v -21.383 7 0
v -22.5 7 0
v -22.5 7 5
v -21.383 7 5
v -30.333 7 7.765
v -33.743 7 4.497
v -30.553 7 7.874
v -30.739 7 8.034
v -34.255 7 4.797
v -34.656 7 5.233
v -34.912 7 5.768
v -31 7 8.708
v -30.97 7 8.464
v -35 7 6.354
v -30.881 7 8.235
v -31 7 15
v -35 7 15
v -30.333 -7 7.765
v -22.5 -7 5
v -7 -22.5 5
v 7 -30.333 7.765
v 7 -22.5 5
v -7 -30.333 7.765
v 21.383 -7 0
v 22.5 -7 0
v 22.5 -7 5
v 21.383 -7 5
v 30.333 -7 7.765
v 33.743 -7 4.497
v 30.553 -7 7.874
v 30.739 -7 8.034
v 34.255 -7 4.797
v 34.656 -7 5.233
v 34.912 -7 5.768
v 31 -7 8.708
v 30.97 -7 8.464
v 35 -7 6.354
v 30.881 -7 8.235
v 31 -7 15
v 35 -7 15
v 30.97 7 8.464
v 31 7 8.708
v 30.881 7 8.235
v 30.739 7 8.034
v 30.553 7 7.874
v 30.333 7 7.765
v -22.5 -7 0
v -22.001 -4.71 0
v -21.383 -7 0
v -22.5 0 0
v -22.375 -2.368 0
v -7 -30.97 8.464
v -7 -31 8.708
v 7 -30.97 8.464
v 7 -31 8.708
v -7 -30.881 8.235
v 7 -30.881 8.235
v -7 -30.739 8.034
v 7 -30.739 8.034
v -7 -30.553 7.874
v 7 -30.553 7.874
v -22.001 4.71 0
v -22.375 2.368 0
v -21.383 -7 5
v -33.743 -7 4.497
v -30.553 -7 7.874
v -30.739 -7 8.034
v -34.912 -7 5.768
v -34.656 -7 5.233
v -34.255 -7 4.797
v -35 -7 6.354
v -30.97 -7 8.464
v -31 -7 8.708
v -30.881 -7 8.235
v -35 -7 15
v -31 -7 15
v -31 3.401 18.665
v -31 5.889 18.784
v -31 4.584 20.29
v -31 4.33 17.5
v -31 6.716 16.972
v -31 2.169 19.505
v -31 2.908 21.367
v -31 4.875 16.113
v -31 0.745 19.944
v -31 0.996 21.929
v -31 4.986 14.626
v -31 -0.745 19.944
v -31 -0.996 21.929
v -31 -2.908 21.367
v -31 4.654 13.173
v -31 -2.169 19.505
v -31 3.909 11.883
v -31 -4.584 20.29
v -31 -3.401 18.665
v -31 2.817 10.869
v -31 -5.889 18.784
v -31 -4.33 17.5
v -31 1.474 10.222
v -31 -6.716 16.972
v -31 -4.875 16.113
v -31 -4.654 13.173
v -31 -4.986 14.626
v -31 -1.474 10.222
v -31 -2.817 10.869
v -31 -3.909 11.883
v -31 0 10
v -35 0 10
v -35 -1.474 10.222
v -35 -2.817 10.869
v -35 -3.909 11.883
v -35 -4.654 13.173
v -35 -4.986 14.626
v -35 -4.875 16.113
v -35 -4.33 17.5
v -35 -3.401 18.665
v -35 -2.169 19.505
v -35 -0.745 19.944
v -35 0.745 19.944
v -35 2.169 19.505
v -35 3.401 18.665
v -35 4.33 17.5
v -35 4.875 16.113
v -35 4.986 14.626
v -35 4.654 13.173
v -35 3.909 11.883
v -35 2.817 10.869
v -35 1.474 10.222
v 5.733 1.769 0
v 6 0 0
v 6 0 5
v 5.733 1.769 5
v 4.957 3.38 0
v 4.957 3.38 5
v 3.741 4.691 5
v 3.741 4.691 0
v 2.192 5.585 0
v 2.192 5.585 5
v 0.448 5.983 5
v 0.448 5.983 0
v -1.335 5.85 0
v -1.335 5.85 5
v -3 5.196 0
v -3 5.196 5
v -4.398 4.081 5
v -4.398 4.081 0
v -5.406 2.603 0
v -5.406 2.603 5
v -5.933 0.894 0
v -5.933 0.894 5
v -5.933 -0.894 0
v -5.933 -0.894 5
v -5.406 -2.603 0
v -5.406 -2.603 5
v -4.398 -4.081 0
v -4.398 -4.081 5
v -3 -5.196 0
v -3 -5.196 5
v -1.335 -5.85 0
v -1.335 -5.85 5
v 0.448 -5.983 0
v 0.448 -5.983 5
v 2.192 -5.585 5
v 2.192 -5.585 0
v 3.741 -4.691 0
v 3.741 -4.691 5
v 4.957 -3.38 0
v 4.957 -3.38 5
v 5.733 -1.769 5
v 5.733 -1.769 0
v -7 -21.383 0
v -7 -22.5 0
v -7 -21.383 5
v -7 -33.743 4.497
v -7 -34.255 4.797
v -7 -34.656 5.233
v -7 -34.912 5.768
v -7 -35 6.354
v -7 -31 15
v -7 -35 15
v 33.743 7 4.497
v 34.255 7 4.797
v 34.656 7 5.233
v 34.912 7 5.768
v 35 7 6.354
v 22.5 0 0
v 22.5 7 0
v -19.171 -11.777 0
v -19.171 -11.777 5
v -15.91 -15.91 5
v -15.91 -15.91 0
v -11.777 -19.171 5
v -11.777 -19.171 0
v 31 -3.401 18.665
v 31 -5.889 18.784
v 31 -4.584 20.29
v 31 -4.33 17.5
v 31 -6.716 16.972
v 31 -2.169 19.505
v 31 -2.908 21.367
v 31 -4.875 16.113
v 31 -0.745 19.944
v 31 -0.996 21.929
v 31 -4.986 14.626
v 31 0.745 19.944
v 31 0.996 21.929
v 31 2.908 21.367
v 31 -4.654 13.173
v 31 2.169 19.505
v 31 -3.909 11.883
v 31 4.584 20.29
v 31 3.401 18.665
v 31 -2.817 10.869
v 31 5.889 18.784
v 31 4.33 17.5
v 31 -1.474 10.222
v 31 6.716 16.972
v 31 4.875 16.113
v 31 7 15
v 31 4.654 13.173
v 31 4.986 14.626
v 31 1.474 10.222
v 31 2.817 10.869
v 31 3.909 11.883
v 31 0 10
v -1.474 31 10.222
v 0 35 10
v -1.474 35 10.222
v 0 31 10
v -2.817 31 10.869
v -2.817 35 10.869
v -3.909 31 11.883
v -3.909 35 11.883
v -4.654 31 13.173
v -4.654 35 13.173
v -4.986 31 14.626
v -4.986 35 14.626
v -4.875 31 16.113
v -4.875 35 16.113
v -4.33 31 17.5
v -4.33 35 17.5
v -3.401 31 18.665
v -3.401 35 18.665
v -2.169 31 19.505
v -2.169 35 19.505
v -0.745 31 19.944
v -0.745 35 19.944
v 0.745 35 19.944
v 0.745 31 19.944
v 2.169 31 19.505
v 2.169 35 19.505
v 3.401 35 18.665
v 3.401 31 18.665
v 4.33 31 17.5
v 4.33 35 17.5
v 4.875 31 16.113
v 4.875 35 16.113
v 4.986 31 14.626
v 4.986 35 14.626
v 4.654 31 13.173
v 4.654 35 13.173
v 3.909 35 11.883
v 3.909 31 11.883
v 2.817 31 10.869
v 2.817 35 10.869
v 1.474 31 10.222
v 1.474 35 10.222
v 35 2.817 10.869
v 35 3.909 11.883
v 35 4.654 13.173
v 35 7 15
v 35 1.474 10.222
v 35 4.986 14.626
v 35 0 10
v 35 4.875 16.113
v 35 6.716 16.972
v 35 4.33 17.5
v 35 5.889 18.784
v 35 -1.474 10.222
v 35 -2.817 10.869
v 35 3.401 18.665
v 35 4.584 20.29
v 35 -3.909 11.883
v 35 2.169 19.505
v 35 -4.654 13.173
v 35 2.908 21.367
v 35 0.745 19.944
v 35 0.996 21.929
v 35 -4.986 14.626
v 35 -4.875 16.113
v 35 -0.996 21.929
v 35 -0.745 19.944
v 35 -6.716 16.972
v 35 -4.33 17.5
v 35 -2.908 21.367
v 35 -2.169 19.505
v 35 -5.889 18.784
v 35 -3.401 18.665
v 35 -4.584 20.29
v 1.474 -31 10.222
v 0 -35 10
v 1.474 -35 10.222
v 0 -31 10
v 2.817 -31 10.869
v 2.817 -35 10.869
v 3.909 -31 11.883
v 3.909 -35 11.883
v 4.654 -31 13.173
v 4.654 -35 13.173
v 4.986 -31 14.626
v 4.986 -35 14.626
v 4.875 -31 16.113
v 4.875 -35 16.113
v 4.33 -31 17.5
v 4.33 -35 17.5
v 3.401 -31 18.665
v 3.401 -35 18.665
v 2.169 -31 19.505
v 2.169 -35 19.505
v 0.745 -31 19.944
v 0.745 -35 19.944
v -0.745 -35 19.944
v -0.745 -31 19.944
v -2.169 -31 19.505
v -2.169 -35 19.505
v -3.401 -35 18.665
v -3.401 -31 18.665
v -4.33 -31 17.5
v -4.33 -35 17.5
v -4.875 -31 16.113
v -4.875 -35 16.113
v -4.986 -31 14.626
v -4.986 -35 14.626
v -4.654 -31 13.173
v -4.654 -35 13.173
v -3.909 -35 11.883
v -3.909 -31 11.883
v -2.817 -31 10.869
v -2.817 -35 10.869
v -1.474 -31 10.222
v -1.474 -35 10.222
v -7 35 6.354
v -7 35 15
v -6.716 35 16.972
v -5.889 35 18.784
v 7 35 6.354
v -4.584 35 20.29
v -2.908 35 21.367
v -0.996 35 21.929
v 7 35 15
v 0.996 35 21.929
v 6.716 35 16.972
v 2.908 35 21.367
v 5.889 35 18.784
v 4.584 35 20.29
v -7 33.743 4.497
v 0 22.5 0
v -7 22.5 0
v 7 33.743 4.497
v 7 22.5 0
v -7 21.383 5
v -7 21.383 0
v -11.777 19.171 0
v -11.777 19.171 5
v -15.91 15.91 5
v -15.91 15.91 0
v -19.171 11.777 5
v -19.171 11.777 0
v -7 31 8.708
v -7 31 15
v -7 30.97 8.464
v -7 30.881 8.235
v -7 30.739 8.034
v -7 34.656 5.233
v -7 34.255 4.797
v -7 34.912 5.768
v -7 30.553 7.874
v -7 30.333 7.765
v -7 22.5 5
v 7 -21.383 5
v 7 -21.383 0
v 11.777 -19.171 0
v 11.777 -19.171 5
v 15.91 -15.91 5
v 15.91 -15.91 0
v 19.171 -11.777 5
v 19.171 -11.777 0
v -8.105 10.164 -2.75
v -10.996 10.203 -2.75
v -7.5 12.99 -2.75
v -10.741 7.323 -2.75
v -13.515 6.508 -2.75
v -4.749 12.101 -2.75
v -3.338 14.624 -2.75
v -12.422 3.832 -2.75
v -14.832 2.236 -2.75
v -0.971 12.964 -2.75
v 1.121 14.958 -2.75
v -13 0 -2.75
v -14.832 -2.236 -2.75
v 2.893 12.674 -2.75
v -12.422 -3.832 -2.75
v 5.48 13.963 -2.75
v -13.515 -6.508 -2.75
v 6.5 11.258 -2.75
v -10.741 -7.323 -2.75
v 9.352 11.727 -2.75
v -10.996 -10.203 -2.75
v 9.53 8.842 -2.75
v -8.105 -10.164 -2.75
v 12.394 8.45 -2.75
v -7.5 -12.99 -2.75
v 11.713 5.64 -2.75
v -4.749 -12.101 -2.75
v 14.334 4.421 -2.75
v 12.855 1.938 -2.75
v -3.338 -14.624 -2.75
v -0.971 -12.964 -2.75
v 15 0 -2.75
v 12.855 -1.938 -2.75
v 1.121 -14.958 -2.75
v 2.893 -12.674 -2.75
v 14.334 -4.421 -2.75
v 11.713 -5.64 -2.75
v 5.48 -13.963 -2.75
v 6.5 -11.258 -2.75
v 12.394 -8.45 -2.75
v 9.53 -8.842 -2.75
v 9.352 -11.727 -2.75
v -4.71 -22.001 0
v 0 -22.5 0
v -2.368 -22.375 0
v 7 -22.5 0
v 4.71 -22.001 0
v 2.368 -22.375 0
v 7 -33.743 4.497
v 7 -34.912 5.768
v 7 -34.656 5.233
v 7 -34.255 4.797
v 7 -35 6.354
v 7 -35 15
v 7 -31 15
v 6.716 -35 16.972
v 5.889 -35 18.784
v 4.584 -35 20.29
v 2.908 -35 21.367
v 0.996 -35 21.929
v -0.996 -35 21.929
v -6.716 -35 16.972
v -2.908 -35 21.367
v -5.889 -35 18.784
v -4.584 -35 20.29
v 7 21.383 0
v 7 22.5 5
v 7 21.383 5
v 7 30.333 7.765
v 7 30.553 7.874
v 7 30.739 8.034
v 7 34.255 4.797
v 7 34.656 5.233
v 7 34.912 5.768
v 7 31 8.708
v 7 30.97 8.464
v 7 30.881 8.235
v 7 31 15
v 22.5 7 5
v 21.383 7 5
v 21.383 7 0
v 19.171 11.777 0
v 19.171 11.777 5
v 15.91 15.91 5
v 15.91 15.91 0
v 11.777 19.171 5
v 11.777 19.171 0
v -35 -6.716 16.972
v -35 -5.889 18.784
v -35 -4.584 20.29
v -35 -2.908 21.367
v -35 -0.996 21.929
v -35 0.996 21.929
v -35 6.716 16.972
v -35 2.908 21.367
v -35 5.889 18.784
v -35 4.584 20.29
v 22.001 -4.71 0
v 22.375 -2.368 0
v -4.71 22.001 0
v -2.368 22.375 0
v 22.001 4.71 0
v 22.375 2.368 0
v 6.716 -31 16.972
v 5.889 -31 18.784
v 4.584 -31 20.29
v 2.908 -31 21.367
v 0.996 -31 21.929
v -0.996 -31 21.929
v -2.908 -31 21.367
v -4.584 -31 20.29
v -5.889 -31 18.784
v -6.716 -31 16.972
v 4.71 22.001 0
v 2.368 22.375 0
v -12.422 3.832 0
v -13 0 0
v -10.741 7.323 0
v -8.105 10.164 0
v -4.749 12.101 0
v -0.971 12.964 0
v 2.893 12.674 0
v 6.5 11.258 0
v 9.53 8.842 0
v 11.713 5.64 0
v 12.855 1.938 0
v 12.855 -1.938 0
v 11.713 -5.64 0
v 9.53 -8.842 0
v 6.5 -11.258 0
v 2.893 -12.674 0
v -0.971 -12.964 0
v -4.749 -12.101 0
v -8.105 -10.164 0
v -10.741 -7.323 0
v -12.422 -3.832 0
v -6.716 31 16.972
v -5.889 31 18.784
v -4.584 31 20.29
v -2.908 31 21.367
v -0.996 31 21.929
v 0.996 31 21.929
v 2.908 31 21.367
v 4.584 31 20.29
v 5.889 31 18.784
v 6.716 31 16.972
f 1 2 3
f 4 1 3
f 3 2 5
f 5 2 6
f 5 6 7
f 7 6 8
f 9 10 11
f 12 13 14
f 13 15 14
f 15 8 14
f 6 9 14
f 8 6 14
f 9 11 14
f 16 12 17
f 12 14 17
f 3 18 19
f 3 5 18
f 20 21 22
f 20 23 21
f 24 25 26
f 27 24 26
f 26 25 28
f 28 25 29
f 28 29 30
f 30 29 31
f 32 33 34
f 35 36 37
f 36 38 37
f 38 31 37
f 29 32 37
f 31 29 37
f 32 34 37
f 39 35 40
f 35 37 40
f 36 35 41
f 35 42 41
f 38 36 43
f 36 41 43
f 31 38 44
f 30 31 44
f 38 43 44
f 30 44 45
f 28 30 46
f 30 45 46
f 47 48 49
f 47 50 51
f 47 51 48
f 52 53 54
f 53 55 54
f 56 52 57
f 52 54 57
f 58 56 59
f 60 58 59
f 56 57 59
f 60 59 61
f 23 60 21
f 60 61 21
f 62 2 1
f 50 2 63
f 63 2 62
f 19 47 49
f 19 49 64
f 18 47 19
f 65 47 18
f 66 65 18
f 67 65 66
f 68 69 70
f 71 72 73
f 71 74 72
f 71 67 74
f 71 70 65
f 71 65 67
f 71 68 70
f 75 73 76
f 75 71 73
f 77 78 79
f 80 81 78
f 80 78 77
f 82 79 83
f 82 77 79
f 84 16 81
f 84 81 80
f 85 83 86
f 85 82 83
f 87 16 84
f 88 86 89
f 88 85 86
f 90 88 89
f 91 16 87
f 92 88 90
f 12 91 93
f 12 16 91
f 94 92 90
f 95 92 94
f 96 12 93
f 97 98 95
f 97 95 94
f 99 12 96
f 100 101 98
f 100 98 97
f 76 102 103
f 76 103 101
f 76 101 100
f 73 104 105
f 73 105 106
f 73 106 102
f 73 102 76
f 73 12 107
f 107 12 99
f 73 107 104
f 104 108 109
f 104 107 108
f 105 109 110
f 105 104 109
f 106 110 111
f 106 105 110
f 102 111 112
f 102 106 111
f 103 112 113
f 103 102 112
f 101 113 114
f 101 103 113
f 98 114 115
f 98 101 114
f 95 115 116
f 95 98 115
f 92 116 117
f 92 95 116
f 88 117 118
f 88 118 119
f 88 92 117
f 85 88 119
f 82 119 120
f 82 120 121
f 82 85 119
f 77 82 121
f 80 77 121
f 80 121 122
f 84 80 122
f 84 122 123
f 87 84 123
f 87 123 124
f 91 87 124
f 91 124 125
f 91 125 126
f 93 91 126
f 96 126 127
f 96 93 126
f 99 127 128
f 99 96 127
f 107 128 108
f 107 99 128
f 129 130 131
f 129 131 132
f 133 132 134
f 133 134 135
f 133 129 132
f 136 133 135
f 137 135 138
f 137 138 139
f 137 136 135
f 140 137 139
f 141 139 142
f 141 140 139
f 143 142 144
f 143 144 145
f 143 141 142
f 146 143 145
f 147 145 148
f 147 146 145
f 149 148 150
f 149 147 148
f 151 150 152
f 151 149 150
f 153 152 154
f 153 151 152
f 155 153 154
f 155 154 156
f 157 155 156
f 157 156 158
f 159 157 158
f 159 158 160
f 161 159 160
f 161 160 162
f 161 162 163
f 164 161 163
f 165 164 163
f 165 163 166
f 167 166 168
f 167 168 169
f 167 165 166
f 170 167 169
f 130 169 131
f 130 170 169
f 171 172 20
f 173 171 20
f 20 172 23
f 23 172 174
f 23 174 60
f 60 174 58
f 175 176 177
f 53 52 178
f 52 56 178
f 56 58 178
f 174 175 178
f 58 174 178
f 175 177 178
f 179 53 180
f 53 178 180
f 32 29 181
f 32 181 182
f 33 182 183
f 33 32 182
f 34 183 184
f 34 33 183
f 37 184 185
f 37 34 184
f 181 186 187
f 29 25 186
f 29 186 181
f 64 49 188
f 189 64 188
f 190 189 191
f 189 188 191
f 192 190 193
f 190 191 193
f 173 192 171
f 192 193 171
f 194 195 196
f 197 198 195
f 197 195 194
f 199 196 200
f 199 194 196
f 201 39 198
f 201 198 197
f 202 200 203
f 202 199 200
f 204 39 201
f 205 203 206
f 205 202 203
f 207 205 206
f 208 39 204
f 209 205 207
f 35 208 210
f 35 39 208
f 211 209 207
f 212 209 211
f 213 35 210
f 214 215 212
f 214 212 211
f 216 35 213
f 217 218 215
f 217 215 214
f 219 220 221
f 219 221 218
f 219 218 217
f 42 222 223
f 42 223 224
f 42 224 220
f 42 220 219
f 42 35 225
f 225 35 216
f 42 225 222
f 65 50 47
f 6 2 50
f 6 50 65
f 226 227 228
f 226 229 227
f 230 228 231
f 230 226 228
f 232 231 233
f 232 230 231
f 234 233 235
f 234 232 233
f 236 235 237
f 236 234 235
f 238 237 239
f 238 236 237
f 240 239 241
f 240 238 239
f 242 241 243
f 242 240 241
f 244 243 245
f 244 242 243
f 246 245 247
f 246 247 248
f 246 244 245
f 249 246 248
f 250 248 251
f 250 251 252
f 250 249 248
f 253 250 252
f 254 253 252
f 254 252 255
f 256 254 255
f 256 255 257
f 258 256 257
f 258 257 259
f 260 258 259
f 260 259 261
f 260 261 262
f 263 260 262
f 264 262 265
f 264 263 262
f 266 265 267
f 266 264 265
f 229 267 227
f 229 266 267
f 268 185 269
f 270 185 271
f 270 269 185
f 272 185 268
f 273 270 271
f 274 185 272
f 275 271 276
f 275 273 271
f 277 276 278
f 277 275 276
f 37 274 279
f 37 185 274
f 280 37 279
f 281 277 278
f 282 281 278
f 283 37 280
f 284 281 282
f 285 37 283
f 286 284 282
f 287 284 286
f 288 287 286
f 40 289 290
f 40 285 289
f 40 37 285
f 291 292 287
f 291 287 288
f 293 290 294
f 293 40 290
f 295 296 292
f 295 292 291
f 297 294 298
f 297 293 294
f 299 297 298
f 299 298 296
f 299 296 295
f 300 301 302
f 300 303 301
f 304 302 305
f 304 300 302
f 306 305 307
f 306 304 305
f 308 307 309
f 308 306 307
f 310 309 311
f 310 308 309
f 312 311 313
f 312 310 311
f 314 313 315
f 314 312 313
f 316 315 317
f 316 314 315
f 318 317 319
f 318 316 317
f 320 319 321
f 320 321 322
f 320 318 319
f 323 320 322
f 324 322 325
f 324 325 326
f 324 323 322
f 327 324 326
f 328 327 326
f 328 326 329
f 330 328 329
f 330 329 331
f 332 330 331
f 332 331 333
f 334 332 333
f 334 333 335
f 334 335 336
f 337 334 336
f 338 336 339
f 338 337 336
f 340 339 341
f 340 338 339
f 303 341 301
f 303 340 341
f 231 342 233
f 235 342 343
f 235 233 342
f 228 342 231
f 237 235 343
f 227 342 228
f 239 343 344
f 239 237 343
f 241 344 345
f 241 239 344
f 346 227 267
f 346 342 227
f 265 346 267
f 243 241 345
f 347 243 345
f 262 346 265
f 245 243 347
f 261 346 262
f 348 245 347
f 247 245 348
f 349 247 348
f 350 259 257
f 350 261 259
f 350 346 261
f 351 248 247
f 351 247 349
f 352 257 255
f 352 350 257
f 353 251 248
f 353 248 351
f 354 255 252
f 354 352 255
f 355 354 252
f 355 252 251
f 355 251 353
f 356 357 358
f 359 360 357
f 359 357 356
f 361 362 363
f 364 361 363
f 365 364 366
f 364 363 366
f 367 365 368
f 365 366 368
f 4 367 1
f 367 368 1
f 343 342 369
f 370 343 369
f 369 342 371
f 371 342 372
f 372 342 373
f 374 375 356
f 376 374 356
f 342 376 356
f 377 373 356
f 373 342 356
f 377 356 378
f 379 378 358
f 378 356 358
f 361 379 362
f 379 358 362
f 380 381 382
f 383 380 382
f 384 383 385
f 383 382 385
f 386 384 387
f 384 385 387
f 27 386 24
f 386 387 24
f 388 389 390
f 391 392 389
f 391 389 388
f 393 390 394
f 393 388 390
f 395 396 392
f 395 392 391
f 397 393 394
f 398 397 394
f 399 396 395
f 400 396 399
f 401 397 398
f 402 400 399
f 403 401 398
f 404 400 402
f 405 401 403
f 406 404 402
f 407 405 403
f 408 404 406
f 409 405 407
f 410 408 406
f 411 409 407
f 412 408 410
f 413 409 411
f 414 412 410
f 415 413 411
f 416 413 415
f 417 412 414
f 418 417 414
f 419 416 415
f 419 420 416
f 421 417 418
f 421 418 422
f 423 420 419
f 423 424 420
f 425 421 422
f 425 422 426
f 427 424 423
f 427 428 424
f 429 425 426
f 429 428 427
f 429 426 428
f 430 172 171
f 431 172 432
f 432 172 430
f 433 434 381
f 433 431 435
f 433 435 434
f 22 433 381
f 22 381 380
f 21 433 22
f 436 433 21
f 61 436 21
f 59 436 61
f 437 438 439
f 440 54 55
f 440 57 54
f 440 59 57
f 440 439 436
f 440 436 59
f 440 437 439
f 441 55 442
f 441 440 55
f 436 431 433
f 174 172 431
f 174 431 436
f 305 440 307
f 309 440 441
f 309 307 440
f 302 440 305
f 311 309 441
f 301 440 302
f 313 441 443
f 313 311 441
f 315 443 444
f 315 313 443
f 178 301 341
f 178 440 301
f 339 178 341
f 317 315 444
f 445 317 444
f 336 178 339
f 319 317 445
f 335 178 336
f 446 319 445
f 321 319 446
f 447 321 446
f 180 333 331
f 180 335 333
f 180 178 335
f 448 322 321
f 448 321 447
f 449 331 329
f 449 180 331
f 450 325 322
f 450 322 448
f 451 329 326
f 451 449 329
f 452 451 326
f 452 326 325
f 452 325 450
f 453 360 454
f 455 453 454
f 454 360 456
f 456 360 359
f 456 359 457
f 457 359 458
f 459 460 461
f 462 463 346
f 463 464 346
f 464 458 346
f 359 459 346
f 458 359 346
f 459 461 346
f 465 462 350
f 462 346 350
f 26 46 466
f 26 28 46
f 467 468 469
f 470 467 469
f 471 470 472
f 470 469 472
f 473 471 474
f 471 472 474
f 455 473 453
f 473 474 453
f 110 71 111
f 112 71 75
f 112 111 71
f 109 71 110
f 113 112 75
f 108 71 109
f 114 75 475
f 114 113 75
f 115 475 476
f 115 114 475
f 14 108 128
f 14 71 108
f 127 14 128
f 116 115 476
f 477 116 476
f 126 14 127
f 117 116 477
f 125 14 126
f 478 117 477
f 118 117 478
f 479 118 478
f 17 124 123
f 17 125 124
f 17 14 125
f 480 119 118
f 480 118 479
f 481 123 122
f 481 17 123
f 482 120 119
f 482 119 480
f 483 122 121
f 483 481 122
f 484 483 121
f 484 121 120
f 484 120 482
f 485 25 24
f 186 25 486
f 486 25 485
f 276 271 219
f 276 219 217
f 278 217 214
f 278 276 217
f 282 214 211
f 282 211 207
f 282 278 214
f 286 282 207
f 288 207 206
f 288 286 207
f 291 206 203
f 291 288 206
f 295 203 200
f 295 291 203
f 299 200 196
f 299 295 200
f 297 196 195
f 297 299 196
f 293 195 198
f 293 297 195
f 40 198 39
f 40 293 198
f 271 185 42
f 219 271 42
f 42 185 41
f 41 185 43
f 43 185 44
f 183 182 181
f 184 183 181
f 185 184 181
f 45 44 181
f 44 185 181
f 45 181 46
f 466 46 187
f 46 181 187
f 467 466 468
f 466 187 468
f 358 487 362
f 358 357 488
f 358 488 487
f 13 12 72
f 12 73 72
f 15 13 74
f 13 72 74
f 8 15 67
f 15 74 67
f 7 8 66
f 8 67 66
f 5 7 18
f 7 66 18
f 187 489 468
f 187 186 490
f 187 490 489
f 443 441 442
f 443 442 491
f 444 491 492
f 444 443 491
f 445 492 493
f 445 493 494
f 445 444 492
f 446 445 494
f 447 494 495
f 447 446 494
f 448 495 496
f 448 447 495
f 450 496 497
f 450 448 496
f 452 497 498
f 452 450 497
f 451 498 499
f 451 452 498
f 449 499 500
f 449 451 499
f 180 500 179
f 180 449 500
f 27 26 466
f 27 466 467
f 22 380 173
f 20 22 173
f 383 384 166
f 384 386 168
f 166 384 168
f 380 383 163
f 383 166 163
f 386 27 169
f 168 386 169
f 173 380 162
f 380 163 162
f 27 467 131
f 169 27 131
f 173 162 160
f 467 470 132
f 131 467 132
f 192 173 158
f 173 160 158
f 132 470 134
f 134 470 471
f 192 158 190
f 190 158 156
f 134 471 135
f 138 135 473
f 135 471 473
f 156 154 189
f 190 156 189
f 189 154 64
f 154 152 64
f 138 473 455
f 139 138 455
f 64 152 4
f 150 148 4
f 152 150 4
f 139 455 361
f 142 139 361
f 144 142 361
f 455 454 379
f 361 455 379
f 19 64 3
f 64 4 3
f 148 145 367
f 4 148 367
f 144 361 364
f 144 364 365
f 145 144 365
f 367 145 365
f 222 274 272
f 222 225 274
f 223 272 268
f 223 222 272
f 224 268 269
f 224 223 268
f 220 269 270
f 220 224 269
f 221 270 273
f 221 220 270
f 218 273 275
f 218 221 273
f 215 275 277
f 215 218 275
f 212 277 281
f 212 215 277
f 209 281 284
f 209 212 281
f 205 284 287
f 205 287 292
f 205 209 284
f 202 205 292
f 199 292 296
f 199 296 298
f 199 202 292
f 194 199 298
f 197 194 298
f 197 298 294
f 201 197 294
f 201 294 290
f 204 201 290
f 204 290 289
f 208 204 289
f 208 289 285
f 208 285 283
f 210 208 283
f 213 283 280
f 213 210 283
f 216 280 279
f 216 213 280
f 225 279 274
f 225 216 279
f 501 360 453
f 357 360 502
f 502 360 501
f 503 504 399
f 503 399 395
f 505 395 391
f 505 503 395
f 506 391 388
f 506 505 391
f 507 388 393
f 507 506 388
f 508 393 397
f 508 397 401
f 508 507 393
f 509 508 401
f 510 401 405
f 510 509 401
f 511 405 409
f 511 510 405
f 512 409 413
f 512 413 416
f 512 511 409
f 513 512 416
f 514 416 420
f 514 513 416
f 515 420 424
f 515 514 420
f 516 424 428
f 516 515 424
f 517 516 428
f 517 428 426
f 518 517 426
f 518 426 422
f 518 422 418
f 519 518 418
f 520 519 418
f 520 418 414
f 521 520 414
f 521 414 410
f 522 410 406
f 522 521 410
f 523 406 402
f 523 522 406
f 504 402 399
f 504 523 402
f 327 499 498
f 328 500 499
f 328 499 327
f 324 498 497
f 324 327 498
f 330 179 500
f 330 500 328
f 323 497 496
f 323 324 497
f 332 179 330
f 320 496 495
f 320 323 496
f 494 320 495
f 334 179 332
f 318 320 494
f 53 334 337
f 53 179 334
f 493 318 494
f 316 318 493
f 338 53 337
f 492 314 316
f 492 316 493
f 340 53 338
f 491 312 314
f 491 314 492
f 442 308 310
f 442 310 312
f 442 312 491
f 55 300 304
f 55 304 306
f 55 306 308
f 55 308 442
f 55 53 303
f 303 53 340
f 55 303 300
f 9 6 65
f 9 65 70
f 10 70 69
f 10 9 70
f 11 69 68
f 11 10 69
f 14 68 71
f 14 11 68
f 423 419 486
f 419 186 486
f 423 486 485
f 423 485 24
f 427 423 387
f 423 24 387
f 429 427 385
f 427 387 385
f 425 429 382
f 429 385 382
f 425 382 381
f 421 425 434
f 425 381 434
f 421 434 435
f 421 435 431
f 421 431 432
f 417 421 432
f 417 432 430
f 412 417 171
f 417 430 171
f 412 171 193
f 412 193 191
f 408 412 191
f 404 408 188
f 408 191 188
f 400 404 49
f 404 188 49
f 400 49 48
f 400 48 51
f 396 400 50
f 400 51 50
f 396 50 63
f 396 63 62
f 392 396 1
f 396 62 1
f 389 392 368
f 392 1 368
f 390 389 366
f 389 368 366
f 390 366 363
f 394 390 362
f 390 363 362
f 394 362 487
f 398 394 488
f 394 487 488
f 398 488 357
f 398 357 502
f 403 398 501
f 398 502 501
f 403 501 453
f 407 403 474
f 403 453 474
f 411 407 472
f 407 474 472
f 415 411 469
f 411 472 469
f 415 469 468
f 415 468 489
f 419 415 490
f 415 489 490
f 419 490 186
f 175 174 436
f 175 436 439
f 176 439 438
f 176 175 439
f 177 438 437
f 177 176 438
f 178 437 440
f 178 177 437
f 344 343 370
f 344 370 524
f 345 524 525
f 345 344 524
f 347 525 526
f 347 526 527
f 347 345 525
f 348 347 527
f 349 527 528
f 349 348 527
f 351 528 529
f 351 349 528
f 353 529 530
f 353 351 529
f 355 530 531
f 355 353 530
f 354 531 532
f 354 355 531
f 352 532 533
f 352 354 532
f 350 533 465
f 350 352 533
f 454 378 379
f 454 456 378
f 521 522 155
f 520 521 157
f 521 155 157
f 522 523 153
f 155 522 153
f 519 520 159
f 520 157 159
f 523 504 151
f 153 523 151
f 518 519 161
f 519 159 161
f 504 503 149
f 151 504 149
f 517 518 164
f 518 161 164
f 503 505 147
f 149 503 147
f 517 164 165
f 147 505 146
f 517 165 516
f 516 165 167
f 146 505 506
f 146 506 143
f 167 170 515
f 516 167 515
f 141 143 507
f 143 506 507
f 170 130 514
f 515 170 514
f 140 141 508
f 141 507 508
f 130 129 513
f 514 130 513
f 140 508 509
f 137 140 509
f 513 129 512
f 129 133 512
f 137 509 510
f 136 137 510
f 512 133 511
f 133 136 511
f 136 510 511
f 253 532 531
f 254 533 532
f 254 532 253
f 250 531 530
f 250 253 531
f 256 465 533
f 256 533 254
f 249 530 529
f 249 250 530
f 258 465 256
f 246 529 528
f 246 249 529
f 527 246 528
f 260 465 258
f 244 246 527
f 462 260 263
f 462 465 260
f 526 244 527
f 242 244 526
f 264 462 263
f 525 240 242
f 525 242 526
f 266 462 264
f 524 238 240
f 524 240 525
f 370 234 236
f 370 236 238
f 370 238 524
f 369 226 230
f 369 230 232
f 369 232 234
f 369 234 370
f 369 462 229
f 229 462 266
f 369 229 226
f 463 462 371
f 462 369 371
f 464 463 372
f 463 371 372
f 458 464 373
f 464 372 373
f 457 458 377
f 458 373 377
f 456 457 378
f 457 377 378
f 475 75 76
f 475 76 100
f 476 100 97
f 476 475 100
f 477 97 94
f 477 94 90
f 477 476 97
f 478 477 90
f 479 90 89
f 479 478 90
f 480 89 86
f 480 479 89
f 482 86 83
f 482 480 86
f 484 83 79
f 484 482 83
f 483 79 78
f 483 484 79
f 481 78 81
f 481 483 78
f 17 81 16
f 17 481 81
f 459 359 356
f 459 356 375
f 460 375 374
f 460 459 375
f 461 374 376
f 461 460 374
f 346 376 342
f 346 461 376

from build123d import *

# Parameters (mm, degrees)
SKETCH3_R                = 22.5
SKETCH3_R_2              = 6
BOSS_EXTRUDE3_DEPTH      = 5
SKETCH4_R                = 15
SKETCH4_R_2              = 13
BOSS_EXTRUDE4_DEPTH      = 2.75
SKETCH10_R               = 7
SKETCH10_R_2             = 5
BOSS_EXTRUDE5_DEPTH      = 2
BOSS_EXTRUDE6_REACH      = 45.9
BOSS_EXTRUDE6_END_RADIUS = 7
SKETCH11_W               = 4
SKETCH11_H               = 14
BOSS_EXTRUDE7_DEPTH      = 14
SKETCH15_W               = 5
SKETCH15_H               = 14
BOSS_EXTRUDE8_DEPTH      = 1.116595
FILLET1_R                = 1
CIRPATTERN4_COUNT        = 4
FILLET1_OF_CIRPATTERN4_R = 1


with BuildPart() as part:
    # Sketch3 → Boss-Extrude3 (new body)
    with BuildSketch(Plane.XY):
        Circle(SKETCH3_R)
        Circle(SKETCH3_R_2, mode=Mode.SUBTRACT)
    extrude(amount=BOSS_EXTRUDE3_DEPTH)

    # Sketch4 → Boss-Extrude4 (add)
    with BuildSketch(Plane(origin=(0, 0, 0), x_dir=(-1, 0, 0), z_dir=(0, 0, -1))):
        with Locations(Location((0, 0, 0), (0, 0, 180))):
            Circle(SKETCH4_R)
        Circle(SKETCH4_R_2, mode=Mode.SUBTRACT)
    extrude(amount=BOSS_EXTRUDE4_DEPTH)

    # Sketch6 → Revolve1 (revolve)
    with BuildSketch(Plane(origin=(0, 0, 0), x_dir=(0, 0, -1), z_dir=(1, 0, 0)), mode=Mode.PRIVATE) as revolve1_sk:
        Polygon((0, 22.5), (0, 15), (2.75, 15), align=None)
    revolve(revolve1_sk.sketch.rotate(Axis((0, 0, 0), (0, 0, -1)), 90), axis=Axis((0, 0, 0), (0, 0, -1)))



with BuildPart() as body_2:
    # Sketch10 → Boss-Extrude5 (new, symmetric)
    with BuildSketch(Plane(origin=(33, 0, 0), x_dir=(0, 0, -1), z_dir=(1, 0, 0))):
        with Locations((-15, 0)):
            Circle(SKETCH10_R)
        with Locations((-15, 0)):
            Circle(SKETCH10_R_2, mode=Mode.SUBTRACT)
    boss_extrude5 = extrude(amount=BOSS_EXTRUDE5_DEPTH, both=True)

    # Boss-Extrude6: up to this cylinder (the profile starts outside it)
    boss_extrude6_end = Plane(origin=(33, 0, 15), z_dir=(-1, 0, 0)) * Cylinder(BOSS_EXTRUDE6_END_RADIUS, 106.8, mode=Mode.PRIVATE)
    # Sketch11 → Boss-Extrude6 (add, up to the surface)
    with BuildSketch(Plane(origin=(0, 0, 8), x_dir=(-1, 0, 0), z_dir=(0, 0, -1)), mode=Mode.PRIVATE) as boss_extrude6_sk1:
        with Locations((-33, 0)):
            Rectangle(SKETCH11_W, SKETCH11_H)
    boss_extrude6_tool1 = extrude(boss_extrude6_sk1.sketch, amount=-BOSS_EXTRUDE6_REACH, mode=Mode.PRIVATE) - boss_extrude6_end
    boss_extrude6 = boss_extrude6_tool1.solids().sort_by_distance((33, 0, 8))[0] + boss_extrude6_tool1.solids().sort_by_distance((33, 0, 8))[1]
    add(boss_extrude6)

    # Sketch12 → Boss-Extrude7 (add)
    with BuildSketch(Plane(origin=(0, -7, 0), x_dir=(1, 0, 0), z_dir=(0, 1, 0))):
        with BuildLine():
            Line((31, -8), (22.5, -5))
            Line((22.5, -5), (22.5, 0))
            Line((22.5, 0), (33.742781353, -4.497112541))
            ThreePointArc((33.742781353, -4.497112541), (34.656134461, -5.232808304), (35, -6.354065923))
            Line((35, -6.354065923), (35, -8))
            Line((35, -8), (31, -8))
        make_face()
    boss_extrude7 = extrude(amount=BOSS_EXTRUDE7_DEPTH)


with BuildPart() as part_1:
    add(part.part)

    add(body_2.part)  # Boss-Extrude8 merges body 2
    # Sketch15 → Boss-Extrude8 (add)
    with BuildSketch(Plane.ZY.offset(-22.5)):
        with Locations((2.5, 0)):
            Rectangle(SKETCH15_W, SKETCH15_H)
    boss_extrude8 = extrude(amount=BOSS_EXTRUDE8_DEPTH)

    # Fillet1
    fillet1_edges = [part_1.edges().sort_by_distance(p)[0] for p in [
        (31, 0, 8),
    ]]
    fillet(fillet1_edges, radius=FILLET1_R)

    # CirPattern4: Boss-Extrude5, Boss-Extrude6, Boss-Extrude7, Boss-Extrude8 ×4 about axis
    cirpattern4_axis = Axis((0, 0, 0), (0, 0, 1))
    add([boss_extrude5.rotate(cirpattern4_axis, i * 360 / CIRPATTERN4_COUNT) for i in range(1, CIRPATTERN4_COUNT)])
    add([boss_extrude6.rotate(cirpattern4_axis, i * 360 / CIRPATTERN4_COUNT) for i in range(1, CIRPATTERN4_COUNT)])
    add([boss_extrude7.rotate(cirpattern4_axis, i * 360 / CIRPATTERN4_COUNT) for i in range(1, CIRPATTERN4_COUNT)])
    add([boss_extrude8.rotate(cirpattern4_axis, i * 360 / CIRPATTERN4_COUNT) for i in range(1, CIRPATTERN4_COUNT)])

    # Fillet1 of CirPattern4
    fillet1_of_cirpattern4_edges = [part_1.edges().sort_by_distance(p)[0] for p in [
        (0, 31, 8),
        (-31, 0, 8),
        (0, -31, 8),
    ]]
    fillet(fillet1_of_cirpattern4_edges, radius=FILLET1_OF_CIRPATTERN4_R)


solid = part_1.part
